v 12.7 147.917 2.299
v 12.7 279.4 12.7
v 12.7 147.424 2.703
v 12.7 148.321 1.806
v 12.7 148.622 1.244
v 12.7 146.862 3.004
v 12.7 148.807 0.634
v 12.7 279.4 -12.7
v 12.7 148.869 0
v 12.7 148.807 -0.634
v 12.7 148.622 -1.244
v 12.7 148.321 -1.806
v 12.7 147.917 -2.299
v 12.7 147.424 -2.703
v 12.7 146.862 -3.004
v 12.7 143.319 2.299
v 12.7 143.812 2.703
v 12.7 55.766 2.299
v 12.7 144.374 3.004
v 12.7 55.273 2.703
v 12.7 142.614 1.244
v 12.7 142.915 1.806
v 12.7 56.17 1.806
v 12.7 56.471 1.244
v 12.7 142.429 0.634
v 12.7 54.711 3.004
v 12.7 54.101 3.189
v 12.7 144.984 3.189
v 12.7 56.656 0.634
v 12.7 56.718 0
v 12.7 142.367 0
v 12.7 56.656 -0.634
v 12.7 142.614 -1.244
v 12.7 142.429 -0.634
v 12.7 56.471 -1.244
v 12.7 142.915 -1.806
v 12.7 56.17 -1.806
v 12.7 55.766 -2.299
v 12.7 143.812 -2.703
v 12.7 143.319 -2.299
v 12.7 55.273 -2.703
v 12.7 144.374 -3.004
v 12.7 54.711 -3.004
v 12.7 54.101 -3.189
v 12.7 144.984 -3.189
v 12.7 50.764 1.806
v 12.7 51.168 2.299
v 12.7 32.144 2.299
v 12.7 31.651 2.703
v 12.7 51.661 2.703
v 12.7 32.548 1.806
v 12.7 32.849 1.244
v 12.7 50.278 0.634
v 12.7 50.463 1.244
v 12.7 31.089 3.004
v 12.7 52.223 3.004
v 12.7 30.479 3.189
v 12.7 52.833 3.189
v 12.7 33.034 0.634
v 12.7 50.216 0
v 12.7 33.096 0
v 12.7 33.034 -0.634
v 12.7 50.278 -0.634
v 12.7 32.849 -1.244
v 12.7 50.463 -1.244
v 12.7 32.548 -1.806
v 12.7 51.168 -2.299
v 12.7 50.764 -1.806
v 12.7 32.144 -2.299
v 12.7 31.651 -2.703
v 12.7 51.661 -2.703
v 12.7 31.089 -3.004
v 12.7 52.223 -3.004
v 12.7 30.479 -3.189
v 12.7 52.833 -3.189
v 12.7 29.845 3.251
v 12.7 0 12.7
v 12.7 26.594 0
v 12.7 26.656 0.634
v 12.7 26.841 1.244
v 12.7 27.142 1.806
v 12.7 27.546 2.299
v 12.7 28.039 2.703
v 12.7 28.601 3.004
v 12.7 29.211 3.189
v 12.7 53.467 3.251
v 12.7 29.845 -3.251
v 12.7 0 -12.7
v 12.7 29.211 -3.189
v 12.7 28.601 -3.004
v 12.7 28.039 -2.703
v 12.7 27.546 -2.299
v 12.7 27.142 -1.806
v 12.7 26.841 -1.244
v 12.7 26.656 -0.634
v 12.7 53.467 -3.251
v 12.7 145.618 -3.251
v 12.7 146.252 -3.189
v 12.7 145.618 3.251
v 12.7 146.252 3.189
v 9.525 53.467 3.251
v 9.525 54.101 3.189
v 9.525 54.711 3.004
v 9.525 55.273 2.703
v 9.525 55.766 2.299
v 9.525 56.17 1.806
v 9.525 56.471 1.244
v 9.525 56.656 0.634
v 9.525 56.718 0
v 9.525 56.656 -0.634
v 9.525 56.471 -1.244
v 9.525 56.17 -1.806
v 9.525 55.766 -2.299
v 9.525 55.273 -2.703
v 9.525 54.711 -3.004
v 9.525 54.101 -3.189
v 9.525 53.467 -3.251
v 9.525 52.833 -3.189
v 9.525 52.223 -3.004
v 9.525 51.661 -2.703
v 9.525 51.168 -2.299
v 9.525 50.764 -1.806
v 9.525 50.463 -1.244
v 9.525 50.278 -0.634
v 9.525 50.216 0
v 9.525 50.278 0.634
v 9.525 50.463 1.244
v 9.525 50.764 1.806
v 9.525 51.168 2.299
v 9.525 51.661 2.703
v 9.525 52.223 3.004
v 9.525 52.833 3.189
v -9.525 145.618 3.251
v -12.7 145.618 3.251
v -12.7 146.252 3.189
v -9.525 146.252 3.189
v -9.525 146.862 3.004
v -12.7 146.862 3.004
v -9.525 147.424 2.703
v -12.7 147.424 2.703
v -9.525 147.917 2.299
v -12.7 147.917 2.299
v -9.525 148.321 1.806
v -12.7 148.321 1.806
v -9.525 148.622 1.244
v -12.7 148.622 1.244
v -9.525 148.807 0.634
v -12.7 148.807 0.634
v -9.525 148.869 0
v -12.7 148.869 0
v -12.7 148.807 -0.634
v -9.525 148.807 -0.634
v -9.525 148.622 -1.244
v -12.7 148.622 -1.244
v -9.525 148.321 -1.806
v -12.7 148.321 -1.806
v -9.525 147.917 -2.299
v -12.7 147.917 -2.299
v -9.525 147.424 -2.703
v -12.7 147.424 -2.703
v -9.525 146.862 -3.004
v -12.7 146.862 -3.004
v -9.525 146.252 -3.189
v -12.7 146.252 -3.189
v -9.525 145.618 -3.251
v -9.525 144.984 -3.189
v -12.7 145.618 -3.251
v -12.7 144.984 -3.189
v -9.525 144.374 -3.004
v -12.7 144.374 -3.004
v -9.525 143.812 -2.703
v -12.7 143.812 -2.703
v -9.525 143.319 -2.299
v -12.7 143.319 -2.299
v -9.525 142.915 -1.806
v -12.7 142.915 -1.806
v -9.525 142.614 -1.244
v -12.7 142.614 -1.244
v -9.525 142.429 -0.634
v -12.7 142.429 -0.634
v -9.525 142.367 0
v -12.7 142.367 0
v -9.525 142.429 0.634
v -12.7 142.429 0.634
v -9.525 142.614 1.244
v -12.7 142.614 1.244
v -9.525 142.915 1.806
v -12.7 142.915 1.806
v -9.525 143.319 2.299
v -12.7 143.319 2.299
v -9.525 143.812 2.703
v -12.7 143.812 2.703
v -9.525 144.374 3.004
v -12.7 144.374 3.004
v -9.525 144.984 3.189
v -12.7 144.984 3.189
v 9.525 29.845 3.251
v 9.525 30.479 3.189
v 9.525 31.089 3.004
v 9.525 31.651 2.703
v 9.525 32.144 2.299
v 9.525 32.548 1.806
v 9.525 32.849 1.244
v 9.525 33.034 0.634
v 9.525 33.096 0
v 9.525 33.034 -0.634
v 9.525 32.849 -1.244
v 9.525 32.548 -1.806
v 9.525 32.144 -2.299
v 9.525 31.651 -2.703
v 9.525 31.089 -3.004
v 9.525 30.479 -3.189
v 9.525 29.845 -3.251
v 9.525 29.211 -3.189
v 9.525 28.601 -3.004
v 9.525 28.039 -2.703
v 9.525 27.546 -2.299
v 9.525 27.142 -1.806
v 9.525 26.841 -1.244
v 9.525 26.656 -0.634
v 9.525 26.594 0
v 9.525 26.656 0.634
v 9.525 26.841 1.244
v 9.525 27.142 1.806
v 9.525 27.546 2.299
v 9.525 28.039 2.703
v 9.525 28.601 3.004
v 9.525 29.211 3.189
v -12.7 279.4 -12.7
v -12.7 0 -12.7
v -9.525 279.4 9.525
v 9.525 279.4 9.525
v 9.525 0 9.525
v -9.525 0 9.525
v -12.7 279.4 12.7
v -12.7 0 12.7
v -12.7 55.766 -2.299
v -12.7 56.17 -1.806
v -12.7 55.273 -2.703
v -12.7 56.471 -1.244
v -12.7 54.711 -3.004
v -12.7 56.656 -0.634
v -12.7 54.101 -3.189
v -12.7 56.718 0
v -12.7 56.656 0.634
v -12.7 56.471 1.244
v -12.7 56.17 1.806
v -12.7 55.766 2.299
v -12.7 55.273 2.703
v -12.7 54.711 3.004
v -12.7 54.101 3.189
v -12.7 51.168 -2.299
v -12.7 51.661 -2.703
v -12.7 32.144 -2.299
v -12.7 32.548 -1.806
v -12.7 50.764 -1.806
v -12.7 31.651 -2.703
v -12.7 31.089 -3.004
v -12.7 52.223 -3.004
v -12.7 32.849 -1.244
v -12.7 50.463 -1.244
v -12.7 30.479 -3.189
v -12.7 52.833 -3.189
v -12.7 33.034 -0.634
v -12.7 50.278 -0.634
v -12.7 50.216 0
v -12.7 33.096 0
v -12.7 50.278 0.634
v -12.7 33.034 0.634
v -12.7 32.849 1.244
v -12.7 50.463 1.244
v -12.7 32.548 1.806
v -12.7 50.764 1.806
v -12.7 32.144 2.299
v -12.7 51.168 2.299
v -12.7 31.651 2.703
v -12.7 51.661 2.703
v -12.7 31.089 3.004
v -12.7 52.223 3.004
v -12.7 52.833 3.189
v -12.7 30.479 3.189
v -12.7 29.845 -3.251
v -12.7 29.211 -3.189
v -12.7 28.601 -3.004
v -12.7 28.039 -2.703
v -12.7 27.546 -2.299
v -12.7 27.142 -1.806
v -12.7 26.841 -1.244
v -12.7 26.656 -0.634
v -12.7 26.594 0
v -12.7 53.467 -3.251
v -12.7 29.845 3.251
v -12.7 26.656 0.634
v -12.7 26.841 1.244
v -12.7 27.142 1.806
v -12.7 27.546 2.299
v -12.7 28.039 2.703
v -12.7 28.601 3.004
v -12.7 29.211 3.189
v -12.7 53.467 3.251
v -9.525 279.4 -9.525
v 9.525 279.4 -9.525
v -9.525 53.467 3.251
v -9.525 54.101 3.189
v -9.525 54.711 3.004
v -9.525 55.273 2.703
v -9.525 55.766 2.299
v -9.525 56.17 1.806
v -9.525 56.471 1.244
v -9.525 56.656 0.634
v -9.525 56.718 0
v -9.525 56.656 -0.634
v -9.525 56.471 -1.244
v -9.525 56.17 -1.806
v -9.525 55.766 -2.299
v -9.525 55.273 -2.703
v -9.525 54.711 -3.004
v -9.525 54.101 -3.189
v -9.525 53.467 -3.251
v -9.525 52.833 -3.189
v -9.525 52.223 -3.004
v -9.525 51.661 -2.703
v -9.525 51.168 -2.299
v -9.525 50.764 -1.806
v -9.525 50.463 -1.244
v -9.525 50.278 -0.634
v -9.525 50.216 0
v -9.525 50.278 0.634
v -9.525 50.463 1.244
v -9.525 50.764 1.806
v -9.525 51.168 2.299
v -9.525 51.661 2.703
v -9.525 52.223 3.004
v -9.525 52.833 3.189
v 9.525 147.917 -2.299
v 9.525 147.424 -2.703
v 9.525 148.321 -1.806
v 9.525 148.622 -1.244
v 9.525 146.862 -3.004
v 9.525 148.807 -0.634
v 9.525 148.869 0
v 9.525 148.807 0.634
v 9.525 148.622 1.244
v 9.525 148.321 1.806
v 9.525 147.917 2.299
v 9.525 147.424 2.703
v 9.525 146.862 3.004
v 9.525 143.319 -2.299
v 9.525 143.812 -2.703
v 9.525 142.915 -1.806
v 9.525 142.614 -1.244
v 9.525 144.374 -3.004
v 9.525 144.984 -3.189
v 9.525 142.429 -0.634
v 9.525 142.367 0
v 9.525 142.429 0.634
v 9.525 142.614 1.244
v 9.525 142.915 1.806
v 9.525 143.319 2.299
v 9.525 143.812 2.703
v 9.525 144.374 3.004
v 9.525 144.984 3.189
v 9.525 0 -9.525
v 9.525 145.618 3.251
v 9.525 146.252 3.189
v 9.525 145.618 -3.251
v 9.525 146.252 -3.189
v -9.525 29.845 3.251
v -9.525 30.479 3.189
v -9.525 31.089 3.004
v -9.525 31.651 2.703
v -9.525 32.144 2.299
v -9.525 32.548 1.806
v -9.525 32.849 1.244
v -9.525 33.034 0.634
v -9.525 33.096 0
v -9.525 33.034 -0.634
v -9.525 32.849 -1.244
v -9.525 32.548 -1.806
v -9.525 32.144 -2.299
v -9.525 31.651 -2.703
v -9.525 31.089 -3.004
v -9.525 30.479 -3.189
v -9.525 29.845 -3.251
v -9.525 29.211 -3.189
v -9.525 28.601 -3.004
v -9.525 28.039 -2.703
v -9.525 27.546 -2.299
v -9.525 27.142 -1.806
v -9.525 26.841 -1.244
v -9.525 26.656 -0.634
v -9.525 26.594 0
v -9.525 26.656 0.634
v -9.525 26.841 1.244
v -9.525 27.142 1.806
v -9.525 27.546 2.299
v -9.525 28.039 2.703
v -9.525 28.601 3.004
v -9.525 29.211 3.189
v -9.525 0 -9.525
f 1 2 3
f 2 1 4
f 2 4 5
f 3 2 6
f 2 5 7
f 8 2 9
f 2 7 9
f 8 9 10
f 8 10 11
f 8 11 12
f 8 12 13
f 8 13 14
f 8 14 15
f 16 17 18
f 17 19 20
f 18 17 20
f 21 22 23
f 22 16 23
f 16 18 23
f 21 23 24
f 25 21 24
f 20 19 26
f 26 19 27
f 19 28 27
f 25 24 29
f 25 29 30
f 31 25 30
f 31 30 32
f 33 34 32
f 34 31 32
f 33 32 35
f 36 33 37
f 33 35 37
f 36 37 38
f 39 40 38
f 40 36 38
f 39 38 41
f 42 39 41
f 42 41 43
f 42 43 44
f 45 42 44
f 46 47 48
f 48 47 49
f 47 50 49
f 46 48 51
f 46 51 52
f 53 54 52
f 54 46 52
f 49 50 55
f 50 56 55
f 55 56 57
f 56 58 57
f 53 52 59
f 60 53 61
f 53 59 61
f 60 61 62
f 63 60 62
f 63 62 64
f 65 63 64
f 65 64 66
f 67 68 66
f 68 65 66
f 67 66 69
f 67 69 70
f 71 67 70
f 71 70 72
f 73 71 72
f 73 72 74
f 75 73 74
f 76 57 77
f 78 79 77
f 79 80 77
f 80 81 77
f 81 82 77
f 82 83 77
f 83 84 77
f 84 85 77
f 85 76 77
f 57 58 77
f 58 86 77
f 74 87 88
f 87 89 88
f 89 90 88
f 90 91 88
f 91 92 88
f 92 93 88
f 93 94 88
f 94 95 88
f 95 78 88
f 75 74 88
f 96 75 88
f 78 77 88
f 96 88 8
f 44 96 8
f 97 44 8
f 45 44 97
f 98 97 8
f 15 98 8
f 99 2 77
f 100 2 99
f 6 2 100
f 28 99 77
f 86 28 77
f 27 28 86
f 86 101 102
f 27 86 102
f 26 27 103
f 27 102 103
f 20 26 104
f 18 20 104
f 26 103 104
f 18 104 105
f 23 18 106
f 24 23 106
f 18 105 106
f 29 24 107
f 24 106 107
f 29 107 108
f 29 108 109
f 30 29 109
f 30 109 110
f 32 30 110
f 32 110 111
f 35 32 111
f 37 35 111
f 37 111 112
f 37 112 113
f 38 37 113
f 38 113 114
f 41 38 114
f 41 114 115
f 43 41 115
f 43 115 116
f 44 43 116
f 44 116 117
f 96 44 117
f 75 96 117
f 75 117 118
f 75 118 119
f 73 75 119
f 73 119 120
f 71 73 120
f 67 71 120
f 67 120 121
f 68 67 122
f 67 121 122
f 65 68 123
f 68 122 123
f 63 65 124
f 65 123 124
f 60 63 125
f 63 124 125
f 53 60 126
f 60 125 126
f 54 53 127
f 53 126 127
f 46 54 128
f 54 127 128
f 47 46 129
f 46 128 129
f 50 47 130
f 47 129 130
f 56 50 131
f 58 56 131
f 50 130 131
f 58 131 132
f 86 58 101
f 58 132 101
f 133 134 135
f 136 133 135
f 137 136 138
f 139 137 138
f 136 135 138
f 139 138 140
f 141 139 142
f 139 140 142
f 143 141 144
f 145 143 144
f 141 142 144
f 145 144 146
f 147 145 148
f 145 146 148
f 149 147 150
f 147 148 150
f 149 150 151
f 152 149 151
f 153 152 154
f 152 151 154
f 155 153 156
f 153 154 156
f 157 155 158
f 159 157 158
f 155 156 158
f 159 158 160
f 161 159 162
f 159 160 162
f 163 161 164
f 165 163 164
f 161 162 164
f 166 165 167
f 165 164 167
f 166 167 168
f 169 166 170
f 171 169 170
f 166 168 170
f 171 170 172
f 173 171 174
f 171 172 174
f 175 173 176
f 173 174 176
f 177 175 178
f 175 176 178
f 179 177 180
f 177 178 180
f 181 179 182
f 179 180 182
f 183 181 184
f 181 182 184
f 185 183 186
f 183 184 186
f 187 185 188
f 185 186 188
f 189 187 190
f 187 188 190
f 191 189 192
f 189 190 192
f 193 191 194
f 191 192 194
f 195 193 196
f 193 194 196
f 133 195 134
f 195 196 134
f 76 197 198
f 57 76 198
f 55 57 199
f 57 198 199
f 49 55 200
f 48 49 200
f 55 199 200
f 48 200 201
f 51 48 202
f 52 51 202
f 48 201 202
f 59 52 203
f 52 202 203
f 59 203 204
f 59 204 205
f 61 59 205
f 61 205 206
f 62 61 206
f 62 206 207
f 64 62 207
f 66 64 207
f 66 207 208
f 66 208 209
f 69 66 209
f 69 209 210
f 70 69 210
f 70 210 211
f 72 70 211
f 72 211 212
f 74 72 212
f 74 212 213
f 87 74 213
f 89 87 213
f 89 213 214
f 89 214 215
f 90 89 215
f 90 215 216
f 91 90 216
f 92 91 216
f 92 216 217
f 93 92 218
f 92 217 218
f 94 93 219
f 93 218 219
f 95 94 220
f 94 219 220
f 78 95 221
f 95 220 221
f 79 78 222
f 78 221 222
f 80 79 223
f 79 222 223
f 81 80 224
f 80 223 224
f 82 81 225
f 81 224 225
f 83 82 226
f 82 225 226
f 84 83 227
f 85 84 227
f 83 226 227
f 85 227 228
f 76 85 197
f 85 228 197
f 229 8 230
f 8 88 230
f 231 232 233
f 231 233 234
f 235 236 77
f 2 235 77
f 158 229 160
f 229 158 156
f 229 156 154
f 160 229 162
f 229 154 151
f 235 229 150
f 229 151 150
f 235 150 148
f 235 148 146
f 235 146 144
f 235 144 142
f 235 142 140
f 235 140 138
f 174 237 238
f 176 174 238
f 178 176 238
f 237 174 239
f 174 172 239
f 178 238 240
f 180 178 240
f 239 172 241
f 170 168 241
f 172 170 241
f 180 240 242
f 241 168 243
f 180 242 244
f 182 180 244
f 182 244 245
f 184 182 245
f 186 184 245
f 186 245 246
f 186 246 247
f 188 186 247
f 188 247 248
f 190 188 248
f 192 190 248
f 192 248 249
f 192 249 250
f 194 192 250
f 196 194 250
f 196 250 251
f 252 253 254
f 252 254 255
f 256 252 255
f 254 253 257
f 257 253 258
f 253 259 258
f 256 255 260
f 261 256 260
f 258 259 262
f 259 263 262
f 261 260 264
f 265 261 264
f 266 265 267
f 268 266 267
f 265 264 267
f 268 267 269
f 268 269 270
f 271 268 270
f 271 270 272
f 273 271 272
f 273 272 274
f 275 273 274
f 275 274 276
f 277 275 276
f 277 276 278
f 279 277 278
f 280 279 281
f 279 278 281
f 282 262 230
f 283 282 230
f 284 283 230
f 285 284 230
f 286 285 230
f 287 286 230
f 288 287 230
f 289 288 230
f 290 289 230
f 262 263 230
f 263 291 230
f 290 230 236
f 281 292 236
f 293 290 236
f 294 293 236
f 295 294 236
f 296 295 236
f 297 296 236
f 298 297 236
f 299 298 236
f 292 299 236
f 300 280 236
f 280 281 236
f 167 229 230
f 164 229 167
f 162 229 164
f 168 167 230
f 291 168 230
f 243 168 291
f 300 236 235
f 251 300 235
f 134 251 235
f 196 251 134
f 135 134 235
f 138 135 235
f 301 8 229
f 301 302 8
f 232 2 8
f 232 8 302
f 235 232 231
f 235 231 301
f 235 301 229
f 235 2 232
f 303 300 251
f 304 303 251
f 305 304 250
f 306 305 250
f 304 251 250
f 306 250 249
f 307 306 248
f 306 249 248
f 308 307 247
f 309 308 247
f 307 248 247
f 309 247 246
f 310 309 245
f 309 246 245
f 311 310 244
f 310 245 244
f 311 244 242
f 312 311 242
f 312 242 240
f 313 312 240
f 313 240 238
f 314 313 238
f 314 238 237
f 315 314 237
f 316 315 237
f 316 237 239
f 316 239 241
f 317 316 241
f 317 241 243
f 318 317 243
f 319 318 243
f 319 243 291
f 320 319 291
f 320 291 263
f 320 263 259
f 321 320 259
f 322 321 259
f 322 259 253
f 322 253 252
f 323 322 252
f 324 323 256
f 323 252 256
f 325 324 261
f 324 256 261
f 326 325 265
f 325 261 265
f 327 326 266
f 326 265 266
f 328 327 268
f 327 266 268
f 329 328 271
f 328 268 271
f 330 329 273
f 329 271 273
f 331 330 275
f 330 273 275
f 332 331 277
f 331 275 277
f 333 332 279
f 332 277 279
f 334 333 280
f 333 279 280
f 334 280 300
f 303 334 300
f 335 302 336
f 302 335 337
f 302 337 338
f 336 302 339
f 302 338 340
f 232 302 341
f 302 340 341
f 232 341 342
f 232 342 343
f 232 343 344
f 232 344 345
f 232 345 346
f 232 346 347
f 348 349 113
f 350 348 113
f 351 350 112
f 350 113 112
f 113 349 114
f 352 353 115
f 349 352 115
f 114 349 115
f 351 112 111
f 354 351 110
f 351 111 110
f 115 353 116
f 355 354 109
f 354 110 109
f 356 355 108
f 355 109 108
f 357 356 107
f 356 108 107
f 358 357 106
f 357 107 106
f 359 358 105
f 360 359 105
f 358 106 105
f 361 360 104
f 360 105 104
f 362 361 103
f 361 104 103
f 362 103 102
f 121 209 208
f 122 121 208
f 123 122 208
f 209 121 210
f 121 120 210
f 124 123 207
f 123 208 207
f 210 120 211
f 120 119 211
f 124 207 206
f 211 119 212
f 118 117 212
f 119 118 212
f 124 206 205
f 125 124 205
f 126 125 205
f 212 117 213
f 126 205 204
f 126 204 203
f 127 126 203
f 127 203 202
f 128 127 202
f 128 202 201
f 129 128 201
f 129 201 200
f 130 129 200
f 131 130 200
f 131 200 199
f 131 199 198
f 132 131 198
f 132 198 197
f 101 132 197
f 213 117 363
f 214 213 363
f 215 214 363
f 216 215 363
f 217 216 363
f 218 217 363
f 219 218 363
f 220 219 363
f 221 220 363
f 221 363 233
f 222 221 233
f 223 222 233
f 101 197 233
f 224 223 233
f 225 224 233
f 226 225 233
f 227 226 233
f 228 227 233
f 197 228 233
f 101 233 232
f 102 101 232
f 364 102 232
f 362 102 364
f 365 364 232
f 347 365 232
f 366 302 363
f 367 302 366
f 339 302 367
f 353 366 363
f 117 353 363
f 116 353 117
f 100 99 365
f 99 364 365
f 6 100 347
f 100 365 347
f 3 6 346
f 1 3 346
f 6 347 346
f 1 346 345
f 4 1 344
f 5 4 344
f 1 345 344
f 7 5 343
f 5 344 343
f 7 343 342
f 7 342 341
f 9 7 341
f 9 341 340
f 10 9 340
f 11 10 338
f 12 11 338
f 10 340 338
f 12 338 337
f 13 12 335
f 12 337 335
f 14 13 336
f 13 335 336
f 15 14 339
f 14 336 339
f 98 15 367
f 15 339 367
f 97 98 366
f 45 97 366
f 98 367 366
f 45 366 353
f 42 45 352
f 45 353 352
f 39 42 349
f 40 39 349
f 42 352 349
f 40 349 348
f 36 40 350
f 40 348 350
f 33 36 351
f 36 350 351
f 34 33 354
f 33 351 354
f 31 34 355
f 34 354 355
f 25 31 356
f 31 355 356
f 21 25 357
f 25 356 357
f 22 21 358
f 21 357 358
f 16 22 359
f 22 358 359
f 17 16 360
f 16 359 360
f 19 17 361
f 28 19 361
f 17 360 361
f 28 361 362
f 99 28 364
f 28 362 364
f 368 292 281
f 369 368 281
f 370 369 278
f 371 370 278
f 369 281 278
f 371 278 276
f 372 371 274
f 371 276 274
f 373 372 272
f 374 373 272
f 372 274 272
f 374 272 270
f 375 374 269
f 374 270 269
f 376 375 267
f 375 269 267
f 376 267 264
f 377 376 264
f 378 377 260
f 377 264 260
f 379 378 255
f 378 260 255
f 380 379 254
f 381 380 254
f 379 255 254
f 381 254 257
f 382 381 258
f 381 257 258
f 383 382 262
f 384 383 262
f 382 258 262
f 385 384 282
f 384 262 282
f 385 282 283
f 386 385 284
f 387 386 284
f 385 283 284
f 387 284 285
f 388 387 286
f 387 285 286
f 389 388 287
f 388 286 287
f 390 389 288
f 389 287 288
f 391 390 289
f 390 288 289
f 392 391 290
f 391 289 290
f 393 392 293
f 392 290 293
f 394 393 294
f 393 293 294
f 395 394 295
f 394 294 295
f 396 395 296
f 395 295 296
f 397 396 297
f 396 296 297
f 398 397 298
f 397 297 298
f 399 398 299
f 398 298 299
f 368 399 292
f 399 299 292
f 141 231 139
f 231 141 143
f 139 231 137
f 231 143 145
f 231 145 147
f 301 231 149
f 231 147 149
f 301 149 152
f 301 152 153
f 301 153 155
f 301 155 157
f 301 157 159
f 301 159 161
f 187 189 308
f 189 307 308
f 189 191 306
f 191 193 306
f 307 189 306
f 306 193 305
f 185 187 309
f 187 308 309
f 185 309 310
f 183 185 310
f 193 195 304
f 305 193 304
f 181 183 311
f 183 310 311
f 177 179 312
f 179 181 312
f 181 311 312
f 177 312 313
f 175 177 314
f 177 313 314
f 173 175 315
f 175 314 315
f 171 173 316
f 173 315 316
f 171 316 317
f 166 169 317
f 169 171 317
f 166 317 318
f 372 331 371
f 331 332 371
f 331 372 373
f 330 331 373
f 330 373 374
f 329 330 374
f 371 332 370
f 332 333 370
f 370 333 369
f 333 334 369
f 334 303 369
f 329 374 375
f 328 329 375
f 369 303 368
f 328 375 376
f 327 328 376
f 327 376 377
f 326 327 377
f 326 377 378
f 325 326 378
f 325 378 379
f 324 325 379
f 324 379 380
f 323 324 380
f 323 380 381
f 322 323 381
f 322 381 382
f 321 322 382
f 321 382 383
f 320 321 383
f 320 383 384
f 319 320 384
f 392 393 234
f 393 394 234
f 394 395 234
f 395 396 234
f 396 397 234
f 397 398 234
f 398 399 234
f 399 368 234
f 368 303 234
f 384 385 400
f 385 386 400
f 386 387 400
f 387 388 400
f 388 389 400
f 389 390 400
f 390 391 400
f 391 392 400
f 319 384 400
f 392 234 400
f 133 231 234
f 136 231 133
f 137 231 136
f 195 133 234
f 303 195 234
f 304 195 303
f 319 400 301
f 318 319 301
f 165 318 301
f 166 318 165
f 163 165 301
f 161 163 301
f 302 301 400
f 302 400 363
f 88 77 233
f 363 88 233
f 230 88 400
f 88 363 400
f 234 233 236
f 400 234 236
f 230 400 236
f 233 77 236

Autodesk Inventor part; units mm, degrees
ref_plane "YZ Plane" through (0, 0, 0) normal (1, 0, 0) x (0, 1, 0)
ref_plane "XZ Plane" through (0, 0, 0) normal (0, 1, 0) x (-1, 0, 0)
ref_plane "XY Plane" through (0, 0, 0) normal (0, 0, 1) x (1, 0, 0)
sketch "Sketch1" plane through (0, 0, 0) normal (0, 1, 0) x (-1, 0, 0)
  line L0 (-12.7, -12.7) -> (12.7, -12.7)
  line L1 (12.7, -12.7) -> (12.7, 12.7)
  line L2 (12.7, 12.7) -> (-12.7, 12.7)
  line L3 (-12.7, 12.7) -> (-12.7, -12.7)
  line L4 (-12.7, -12.7) -> (12.7, 12.7) construction
  line L5 (12.7, -12.7) -> (-12.7, 12.7) construction
  line L6 (-9.525, 9.525) -> (9.525, 9.525)
  line L7 (9.525, 9.525) -> (9.525, -9.525)
  line L8 (9.525, -9.525) -> (-9.525, -9.525)
  line L9 (-9.525, -9.525) -> (-9.525, 9.525)
  point P0 (0, 0)
  dimension "d0" = 25.4
  dimension "d1" = 25.4
  dimension "d2" = 3.175
extrude "Extrusion1" add sketch "Sketch1" along normal blind 279.4
sketch "Sketch2" plane through (-12.7, 0, -12.7) normal (-1, 0, 0) x (0, 0, 1)
  line L0 (22.225, 279.4) -> (3.175, 279.4) projected
  line L1 (12.7, 279.4) -> (12.7, 145.6182) construction
  line L2 (12.7, 0) -> (12.7, 29.845) construction
  circle A0 centre (12.7, 145.6182) radius 3.2512
  circle A1 centre (12.7, 29.845) radius 3.2512
  line L3 (12.7, 0) -> (12.7, 53.467) construction
  circle A2 centre (12.7, 53.467) radius 3.2512
  line L4 (0, 0) -> (25.4, 0) construction
  dimension "d5" = 6.5024
  dimension "d6" = 133.7818
  dimension "d7" = 6.5024
  dimension "d8" = 29.845
  dimension "d11" = 53.467
  dimension "d12" = 6.5024
extrude "Extrusion2" cut sketch "Sketch2" against normal blind 25.4 contours A0 | A1
extrude "Extrusion3" cut sketch "Sketch2" against normal blind 25.4 contours A2
properties part number "STRU_023_Kenji_11in" material "Aluminum 6061"
